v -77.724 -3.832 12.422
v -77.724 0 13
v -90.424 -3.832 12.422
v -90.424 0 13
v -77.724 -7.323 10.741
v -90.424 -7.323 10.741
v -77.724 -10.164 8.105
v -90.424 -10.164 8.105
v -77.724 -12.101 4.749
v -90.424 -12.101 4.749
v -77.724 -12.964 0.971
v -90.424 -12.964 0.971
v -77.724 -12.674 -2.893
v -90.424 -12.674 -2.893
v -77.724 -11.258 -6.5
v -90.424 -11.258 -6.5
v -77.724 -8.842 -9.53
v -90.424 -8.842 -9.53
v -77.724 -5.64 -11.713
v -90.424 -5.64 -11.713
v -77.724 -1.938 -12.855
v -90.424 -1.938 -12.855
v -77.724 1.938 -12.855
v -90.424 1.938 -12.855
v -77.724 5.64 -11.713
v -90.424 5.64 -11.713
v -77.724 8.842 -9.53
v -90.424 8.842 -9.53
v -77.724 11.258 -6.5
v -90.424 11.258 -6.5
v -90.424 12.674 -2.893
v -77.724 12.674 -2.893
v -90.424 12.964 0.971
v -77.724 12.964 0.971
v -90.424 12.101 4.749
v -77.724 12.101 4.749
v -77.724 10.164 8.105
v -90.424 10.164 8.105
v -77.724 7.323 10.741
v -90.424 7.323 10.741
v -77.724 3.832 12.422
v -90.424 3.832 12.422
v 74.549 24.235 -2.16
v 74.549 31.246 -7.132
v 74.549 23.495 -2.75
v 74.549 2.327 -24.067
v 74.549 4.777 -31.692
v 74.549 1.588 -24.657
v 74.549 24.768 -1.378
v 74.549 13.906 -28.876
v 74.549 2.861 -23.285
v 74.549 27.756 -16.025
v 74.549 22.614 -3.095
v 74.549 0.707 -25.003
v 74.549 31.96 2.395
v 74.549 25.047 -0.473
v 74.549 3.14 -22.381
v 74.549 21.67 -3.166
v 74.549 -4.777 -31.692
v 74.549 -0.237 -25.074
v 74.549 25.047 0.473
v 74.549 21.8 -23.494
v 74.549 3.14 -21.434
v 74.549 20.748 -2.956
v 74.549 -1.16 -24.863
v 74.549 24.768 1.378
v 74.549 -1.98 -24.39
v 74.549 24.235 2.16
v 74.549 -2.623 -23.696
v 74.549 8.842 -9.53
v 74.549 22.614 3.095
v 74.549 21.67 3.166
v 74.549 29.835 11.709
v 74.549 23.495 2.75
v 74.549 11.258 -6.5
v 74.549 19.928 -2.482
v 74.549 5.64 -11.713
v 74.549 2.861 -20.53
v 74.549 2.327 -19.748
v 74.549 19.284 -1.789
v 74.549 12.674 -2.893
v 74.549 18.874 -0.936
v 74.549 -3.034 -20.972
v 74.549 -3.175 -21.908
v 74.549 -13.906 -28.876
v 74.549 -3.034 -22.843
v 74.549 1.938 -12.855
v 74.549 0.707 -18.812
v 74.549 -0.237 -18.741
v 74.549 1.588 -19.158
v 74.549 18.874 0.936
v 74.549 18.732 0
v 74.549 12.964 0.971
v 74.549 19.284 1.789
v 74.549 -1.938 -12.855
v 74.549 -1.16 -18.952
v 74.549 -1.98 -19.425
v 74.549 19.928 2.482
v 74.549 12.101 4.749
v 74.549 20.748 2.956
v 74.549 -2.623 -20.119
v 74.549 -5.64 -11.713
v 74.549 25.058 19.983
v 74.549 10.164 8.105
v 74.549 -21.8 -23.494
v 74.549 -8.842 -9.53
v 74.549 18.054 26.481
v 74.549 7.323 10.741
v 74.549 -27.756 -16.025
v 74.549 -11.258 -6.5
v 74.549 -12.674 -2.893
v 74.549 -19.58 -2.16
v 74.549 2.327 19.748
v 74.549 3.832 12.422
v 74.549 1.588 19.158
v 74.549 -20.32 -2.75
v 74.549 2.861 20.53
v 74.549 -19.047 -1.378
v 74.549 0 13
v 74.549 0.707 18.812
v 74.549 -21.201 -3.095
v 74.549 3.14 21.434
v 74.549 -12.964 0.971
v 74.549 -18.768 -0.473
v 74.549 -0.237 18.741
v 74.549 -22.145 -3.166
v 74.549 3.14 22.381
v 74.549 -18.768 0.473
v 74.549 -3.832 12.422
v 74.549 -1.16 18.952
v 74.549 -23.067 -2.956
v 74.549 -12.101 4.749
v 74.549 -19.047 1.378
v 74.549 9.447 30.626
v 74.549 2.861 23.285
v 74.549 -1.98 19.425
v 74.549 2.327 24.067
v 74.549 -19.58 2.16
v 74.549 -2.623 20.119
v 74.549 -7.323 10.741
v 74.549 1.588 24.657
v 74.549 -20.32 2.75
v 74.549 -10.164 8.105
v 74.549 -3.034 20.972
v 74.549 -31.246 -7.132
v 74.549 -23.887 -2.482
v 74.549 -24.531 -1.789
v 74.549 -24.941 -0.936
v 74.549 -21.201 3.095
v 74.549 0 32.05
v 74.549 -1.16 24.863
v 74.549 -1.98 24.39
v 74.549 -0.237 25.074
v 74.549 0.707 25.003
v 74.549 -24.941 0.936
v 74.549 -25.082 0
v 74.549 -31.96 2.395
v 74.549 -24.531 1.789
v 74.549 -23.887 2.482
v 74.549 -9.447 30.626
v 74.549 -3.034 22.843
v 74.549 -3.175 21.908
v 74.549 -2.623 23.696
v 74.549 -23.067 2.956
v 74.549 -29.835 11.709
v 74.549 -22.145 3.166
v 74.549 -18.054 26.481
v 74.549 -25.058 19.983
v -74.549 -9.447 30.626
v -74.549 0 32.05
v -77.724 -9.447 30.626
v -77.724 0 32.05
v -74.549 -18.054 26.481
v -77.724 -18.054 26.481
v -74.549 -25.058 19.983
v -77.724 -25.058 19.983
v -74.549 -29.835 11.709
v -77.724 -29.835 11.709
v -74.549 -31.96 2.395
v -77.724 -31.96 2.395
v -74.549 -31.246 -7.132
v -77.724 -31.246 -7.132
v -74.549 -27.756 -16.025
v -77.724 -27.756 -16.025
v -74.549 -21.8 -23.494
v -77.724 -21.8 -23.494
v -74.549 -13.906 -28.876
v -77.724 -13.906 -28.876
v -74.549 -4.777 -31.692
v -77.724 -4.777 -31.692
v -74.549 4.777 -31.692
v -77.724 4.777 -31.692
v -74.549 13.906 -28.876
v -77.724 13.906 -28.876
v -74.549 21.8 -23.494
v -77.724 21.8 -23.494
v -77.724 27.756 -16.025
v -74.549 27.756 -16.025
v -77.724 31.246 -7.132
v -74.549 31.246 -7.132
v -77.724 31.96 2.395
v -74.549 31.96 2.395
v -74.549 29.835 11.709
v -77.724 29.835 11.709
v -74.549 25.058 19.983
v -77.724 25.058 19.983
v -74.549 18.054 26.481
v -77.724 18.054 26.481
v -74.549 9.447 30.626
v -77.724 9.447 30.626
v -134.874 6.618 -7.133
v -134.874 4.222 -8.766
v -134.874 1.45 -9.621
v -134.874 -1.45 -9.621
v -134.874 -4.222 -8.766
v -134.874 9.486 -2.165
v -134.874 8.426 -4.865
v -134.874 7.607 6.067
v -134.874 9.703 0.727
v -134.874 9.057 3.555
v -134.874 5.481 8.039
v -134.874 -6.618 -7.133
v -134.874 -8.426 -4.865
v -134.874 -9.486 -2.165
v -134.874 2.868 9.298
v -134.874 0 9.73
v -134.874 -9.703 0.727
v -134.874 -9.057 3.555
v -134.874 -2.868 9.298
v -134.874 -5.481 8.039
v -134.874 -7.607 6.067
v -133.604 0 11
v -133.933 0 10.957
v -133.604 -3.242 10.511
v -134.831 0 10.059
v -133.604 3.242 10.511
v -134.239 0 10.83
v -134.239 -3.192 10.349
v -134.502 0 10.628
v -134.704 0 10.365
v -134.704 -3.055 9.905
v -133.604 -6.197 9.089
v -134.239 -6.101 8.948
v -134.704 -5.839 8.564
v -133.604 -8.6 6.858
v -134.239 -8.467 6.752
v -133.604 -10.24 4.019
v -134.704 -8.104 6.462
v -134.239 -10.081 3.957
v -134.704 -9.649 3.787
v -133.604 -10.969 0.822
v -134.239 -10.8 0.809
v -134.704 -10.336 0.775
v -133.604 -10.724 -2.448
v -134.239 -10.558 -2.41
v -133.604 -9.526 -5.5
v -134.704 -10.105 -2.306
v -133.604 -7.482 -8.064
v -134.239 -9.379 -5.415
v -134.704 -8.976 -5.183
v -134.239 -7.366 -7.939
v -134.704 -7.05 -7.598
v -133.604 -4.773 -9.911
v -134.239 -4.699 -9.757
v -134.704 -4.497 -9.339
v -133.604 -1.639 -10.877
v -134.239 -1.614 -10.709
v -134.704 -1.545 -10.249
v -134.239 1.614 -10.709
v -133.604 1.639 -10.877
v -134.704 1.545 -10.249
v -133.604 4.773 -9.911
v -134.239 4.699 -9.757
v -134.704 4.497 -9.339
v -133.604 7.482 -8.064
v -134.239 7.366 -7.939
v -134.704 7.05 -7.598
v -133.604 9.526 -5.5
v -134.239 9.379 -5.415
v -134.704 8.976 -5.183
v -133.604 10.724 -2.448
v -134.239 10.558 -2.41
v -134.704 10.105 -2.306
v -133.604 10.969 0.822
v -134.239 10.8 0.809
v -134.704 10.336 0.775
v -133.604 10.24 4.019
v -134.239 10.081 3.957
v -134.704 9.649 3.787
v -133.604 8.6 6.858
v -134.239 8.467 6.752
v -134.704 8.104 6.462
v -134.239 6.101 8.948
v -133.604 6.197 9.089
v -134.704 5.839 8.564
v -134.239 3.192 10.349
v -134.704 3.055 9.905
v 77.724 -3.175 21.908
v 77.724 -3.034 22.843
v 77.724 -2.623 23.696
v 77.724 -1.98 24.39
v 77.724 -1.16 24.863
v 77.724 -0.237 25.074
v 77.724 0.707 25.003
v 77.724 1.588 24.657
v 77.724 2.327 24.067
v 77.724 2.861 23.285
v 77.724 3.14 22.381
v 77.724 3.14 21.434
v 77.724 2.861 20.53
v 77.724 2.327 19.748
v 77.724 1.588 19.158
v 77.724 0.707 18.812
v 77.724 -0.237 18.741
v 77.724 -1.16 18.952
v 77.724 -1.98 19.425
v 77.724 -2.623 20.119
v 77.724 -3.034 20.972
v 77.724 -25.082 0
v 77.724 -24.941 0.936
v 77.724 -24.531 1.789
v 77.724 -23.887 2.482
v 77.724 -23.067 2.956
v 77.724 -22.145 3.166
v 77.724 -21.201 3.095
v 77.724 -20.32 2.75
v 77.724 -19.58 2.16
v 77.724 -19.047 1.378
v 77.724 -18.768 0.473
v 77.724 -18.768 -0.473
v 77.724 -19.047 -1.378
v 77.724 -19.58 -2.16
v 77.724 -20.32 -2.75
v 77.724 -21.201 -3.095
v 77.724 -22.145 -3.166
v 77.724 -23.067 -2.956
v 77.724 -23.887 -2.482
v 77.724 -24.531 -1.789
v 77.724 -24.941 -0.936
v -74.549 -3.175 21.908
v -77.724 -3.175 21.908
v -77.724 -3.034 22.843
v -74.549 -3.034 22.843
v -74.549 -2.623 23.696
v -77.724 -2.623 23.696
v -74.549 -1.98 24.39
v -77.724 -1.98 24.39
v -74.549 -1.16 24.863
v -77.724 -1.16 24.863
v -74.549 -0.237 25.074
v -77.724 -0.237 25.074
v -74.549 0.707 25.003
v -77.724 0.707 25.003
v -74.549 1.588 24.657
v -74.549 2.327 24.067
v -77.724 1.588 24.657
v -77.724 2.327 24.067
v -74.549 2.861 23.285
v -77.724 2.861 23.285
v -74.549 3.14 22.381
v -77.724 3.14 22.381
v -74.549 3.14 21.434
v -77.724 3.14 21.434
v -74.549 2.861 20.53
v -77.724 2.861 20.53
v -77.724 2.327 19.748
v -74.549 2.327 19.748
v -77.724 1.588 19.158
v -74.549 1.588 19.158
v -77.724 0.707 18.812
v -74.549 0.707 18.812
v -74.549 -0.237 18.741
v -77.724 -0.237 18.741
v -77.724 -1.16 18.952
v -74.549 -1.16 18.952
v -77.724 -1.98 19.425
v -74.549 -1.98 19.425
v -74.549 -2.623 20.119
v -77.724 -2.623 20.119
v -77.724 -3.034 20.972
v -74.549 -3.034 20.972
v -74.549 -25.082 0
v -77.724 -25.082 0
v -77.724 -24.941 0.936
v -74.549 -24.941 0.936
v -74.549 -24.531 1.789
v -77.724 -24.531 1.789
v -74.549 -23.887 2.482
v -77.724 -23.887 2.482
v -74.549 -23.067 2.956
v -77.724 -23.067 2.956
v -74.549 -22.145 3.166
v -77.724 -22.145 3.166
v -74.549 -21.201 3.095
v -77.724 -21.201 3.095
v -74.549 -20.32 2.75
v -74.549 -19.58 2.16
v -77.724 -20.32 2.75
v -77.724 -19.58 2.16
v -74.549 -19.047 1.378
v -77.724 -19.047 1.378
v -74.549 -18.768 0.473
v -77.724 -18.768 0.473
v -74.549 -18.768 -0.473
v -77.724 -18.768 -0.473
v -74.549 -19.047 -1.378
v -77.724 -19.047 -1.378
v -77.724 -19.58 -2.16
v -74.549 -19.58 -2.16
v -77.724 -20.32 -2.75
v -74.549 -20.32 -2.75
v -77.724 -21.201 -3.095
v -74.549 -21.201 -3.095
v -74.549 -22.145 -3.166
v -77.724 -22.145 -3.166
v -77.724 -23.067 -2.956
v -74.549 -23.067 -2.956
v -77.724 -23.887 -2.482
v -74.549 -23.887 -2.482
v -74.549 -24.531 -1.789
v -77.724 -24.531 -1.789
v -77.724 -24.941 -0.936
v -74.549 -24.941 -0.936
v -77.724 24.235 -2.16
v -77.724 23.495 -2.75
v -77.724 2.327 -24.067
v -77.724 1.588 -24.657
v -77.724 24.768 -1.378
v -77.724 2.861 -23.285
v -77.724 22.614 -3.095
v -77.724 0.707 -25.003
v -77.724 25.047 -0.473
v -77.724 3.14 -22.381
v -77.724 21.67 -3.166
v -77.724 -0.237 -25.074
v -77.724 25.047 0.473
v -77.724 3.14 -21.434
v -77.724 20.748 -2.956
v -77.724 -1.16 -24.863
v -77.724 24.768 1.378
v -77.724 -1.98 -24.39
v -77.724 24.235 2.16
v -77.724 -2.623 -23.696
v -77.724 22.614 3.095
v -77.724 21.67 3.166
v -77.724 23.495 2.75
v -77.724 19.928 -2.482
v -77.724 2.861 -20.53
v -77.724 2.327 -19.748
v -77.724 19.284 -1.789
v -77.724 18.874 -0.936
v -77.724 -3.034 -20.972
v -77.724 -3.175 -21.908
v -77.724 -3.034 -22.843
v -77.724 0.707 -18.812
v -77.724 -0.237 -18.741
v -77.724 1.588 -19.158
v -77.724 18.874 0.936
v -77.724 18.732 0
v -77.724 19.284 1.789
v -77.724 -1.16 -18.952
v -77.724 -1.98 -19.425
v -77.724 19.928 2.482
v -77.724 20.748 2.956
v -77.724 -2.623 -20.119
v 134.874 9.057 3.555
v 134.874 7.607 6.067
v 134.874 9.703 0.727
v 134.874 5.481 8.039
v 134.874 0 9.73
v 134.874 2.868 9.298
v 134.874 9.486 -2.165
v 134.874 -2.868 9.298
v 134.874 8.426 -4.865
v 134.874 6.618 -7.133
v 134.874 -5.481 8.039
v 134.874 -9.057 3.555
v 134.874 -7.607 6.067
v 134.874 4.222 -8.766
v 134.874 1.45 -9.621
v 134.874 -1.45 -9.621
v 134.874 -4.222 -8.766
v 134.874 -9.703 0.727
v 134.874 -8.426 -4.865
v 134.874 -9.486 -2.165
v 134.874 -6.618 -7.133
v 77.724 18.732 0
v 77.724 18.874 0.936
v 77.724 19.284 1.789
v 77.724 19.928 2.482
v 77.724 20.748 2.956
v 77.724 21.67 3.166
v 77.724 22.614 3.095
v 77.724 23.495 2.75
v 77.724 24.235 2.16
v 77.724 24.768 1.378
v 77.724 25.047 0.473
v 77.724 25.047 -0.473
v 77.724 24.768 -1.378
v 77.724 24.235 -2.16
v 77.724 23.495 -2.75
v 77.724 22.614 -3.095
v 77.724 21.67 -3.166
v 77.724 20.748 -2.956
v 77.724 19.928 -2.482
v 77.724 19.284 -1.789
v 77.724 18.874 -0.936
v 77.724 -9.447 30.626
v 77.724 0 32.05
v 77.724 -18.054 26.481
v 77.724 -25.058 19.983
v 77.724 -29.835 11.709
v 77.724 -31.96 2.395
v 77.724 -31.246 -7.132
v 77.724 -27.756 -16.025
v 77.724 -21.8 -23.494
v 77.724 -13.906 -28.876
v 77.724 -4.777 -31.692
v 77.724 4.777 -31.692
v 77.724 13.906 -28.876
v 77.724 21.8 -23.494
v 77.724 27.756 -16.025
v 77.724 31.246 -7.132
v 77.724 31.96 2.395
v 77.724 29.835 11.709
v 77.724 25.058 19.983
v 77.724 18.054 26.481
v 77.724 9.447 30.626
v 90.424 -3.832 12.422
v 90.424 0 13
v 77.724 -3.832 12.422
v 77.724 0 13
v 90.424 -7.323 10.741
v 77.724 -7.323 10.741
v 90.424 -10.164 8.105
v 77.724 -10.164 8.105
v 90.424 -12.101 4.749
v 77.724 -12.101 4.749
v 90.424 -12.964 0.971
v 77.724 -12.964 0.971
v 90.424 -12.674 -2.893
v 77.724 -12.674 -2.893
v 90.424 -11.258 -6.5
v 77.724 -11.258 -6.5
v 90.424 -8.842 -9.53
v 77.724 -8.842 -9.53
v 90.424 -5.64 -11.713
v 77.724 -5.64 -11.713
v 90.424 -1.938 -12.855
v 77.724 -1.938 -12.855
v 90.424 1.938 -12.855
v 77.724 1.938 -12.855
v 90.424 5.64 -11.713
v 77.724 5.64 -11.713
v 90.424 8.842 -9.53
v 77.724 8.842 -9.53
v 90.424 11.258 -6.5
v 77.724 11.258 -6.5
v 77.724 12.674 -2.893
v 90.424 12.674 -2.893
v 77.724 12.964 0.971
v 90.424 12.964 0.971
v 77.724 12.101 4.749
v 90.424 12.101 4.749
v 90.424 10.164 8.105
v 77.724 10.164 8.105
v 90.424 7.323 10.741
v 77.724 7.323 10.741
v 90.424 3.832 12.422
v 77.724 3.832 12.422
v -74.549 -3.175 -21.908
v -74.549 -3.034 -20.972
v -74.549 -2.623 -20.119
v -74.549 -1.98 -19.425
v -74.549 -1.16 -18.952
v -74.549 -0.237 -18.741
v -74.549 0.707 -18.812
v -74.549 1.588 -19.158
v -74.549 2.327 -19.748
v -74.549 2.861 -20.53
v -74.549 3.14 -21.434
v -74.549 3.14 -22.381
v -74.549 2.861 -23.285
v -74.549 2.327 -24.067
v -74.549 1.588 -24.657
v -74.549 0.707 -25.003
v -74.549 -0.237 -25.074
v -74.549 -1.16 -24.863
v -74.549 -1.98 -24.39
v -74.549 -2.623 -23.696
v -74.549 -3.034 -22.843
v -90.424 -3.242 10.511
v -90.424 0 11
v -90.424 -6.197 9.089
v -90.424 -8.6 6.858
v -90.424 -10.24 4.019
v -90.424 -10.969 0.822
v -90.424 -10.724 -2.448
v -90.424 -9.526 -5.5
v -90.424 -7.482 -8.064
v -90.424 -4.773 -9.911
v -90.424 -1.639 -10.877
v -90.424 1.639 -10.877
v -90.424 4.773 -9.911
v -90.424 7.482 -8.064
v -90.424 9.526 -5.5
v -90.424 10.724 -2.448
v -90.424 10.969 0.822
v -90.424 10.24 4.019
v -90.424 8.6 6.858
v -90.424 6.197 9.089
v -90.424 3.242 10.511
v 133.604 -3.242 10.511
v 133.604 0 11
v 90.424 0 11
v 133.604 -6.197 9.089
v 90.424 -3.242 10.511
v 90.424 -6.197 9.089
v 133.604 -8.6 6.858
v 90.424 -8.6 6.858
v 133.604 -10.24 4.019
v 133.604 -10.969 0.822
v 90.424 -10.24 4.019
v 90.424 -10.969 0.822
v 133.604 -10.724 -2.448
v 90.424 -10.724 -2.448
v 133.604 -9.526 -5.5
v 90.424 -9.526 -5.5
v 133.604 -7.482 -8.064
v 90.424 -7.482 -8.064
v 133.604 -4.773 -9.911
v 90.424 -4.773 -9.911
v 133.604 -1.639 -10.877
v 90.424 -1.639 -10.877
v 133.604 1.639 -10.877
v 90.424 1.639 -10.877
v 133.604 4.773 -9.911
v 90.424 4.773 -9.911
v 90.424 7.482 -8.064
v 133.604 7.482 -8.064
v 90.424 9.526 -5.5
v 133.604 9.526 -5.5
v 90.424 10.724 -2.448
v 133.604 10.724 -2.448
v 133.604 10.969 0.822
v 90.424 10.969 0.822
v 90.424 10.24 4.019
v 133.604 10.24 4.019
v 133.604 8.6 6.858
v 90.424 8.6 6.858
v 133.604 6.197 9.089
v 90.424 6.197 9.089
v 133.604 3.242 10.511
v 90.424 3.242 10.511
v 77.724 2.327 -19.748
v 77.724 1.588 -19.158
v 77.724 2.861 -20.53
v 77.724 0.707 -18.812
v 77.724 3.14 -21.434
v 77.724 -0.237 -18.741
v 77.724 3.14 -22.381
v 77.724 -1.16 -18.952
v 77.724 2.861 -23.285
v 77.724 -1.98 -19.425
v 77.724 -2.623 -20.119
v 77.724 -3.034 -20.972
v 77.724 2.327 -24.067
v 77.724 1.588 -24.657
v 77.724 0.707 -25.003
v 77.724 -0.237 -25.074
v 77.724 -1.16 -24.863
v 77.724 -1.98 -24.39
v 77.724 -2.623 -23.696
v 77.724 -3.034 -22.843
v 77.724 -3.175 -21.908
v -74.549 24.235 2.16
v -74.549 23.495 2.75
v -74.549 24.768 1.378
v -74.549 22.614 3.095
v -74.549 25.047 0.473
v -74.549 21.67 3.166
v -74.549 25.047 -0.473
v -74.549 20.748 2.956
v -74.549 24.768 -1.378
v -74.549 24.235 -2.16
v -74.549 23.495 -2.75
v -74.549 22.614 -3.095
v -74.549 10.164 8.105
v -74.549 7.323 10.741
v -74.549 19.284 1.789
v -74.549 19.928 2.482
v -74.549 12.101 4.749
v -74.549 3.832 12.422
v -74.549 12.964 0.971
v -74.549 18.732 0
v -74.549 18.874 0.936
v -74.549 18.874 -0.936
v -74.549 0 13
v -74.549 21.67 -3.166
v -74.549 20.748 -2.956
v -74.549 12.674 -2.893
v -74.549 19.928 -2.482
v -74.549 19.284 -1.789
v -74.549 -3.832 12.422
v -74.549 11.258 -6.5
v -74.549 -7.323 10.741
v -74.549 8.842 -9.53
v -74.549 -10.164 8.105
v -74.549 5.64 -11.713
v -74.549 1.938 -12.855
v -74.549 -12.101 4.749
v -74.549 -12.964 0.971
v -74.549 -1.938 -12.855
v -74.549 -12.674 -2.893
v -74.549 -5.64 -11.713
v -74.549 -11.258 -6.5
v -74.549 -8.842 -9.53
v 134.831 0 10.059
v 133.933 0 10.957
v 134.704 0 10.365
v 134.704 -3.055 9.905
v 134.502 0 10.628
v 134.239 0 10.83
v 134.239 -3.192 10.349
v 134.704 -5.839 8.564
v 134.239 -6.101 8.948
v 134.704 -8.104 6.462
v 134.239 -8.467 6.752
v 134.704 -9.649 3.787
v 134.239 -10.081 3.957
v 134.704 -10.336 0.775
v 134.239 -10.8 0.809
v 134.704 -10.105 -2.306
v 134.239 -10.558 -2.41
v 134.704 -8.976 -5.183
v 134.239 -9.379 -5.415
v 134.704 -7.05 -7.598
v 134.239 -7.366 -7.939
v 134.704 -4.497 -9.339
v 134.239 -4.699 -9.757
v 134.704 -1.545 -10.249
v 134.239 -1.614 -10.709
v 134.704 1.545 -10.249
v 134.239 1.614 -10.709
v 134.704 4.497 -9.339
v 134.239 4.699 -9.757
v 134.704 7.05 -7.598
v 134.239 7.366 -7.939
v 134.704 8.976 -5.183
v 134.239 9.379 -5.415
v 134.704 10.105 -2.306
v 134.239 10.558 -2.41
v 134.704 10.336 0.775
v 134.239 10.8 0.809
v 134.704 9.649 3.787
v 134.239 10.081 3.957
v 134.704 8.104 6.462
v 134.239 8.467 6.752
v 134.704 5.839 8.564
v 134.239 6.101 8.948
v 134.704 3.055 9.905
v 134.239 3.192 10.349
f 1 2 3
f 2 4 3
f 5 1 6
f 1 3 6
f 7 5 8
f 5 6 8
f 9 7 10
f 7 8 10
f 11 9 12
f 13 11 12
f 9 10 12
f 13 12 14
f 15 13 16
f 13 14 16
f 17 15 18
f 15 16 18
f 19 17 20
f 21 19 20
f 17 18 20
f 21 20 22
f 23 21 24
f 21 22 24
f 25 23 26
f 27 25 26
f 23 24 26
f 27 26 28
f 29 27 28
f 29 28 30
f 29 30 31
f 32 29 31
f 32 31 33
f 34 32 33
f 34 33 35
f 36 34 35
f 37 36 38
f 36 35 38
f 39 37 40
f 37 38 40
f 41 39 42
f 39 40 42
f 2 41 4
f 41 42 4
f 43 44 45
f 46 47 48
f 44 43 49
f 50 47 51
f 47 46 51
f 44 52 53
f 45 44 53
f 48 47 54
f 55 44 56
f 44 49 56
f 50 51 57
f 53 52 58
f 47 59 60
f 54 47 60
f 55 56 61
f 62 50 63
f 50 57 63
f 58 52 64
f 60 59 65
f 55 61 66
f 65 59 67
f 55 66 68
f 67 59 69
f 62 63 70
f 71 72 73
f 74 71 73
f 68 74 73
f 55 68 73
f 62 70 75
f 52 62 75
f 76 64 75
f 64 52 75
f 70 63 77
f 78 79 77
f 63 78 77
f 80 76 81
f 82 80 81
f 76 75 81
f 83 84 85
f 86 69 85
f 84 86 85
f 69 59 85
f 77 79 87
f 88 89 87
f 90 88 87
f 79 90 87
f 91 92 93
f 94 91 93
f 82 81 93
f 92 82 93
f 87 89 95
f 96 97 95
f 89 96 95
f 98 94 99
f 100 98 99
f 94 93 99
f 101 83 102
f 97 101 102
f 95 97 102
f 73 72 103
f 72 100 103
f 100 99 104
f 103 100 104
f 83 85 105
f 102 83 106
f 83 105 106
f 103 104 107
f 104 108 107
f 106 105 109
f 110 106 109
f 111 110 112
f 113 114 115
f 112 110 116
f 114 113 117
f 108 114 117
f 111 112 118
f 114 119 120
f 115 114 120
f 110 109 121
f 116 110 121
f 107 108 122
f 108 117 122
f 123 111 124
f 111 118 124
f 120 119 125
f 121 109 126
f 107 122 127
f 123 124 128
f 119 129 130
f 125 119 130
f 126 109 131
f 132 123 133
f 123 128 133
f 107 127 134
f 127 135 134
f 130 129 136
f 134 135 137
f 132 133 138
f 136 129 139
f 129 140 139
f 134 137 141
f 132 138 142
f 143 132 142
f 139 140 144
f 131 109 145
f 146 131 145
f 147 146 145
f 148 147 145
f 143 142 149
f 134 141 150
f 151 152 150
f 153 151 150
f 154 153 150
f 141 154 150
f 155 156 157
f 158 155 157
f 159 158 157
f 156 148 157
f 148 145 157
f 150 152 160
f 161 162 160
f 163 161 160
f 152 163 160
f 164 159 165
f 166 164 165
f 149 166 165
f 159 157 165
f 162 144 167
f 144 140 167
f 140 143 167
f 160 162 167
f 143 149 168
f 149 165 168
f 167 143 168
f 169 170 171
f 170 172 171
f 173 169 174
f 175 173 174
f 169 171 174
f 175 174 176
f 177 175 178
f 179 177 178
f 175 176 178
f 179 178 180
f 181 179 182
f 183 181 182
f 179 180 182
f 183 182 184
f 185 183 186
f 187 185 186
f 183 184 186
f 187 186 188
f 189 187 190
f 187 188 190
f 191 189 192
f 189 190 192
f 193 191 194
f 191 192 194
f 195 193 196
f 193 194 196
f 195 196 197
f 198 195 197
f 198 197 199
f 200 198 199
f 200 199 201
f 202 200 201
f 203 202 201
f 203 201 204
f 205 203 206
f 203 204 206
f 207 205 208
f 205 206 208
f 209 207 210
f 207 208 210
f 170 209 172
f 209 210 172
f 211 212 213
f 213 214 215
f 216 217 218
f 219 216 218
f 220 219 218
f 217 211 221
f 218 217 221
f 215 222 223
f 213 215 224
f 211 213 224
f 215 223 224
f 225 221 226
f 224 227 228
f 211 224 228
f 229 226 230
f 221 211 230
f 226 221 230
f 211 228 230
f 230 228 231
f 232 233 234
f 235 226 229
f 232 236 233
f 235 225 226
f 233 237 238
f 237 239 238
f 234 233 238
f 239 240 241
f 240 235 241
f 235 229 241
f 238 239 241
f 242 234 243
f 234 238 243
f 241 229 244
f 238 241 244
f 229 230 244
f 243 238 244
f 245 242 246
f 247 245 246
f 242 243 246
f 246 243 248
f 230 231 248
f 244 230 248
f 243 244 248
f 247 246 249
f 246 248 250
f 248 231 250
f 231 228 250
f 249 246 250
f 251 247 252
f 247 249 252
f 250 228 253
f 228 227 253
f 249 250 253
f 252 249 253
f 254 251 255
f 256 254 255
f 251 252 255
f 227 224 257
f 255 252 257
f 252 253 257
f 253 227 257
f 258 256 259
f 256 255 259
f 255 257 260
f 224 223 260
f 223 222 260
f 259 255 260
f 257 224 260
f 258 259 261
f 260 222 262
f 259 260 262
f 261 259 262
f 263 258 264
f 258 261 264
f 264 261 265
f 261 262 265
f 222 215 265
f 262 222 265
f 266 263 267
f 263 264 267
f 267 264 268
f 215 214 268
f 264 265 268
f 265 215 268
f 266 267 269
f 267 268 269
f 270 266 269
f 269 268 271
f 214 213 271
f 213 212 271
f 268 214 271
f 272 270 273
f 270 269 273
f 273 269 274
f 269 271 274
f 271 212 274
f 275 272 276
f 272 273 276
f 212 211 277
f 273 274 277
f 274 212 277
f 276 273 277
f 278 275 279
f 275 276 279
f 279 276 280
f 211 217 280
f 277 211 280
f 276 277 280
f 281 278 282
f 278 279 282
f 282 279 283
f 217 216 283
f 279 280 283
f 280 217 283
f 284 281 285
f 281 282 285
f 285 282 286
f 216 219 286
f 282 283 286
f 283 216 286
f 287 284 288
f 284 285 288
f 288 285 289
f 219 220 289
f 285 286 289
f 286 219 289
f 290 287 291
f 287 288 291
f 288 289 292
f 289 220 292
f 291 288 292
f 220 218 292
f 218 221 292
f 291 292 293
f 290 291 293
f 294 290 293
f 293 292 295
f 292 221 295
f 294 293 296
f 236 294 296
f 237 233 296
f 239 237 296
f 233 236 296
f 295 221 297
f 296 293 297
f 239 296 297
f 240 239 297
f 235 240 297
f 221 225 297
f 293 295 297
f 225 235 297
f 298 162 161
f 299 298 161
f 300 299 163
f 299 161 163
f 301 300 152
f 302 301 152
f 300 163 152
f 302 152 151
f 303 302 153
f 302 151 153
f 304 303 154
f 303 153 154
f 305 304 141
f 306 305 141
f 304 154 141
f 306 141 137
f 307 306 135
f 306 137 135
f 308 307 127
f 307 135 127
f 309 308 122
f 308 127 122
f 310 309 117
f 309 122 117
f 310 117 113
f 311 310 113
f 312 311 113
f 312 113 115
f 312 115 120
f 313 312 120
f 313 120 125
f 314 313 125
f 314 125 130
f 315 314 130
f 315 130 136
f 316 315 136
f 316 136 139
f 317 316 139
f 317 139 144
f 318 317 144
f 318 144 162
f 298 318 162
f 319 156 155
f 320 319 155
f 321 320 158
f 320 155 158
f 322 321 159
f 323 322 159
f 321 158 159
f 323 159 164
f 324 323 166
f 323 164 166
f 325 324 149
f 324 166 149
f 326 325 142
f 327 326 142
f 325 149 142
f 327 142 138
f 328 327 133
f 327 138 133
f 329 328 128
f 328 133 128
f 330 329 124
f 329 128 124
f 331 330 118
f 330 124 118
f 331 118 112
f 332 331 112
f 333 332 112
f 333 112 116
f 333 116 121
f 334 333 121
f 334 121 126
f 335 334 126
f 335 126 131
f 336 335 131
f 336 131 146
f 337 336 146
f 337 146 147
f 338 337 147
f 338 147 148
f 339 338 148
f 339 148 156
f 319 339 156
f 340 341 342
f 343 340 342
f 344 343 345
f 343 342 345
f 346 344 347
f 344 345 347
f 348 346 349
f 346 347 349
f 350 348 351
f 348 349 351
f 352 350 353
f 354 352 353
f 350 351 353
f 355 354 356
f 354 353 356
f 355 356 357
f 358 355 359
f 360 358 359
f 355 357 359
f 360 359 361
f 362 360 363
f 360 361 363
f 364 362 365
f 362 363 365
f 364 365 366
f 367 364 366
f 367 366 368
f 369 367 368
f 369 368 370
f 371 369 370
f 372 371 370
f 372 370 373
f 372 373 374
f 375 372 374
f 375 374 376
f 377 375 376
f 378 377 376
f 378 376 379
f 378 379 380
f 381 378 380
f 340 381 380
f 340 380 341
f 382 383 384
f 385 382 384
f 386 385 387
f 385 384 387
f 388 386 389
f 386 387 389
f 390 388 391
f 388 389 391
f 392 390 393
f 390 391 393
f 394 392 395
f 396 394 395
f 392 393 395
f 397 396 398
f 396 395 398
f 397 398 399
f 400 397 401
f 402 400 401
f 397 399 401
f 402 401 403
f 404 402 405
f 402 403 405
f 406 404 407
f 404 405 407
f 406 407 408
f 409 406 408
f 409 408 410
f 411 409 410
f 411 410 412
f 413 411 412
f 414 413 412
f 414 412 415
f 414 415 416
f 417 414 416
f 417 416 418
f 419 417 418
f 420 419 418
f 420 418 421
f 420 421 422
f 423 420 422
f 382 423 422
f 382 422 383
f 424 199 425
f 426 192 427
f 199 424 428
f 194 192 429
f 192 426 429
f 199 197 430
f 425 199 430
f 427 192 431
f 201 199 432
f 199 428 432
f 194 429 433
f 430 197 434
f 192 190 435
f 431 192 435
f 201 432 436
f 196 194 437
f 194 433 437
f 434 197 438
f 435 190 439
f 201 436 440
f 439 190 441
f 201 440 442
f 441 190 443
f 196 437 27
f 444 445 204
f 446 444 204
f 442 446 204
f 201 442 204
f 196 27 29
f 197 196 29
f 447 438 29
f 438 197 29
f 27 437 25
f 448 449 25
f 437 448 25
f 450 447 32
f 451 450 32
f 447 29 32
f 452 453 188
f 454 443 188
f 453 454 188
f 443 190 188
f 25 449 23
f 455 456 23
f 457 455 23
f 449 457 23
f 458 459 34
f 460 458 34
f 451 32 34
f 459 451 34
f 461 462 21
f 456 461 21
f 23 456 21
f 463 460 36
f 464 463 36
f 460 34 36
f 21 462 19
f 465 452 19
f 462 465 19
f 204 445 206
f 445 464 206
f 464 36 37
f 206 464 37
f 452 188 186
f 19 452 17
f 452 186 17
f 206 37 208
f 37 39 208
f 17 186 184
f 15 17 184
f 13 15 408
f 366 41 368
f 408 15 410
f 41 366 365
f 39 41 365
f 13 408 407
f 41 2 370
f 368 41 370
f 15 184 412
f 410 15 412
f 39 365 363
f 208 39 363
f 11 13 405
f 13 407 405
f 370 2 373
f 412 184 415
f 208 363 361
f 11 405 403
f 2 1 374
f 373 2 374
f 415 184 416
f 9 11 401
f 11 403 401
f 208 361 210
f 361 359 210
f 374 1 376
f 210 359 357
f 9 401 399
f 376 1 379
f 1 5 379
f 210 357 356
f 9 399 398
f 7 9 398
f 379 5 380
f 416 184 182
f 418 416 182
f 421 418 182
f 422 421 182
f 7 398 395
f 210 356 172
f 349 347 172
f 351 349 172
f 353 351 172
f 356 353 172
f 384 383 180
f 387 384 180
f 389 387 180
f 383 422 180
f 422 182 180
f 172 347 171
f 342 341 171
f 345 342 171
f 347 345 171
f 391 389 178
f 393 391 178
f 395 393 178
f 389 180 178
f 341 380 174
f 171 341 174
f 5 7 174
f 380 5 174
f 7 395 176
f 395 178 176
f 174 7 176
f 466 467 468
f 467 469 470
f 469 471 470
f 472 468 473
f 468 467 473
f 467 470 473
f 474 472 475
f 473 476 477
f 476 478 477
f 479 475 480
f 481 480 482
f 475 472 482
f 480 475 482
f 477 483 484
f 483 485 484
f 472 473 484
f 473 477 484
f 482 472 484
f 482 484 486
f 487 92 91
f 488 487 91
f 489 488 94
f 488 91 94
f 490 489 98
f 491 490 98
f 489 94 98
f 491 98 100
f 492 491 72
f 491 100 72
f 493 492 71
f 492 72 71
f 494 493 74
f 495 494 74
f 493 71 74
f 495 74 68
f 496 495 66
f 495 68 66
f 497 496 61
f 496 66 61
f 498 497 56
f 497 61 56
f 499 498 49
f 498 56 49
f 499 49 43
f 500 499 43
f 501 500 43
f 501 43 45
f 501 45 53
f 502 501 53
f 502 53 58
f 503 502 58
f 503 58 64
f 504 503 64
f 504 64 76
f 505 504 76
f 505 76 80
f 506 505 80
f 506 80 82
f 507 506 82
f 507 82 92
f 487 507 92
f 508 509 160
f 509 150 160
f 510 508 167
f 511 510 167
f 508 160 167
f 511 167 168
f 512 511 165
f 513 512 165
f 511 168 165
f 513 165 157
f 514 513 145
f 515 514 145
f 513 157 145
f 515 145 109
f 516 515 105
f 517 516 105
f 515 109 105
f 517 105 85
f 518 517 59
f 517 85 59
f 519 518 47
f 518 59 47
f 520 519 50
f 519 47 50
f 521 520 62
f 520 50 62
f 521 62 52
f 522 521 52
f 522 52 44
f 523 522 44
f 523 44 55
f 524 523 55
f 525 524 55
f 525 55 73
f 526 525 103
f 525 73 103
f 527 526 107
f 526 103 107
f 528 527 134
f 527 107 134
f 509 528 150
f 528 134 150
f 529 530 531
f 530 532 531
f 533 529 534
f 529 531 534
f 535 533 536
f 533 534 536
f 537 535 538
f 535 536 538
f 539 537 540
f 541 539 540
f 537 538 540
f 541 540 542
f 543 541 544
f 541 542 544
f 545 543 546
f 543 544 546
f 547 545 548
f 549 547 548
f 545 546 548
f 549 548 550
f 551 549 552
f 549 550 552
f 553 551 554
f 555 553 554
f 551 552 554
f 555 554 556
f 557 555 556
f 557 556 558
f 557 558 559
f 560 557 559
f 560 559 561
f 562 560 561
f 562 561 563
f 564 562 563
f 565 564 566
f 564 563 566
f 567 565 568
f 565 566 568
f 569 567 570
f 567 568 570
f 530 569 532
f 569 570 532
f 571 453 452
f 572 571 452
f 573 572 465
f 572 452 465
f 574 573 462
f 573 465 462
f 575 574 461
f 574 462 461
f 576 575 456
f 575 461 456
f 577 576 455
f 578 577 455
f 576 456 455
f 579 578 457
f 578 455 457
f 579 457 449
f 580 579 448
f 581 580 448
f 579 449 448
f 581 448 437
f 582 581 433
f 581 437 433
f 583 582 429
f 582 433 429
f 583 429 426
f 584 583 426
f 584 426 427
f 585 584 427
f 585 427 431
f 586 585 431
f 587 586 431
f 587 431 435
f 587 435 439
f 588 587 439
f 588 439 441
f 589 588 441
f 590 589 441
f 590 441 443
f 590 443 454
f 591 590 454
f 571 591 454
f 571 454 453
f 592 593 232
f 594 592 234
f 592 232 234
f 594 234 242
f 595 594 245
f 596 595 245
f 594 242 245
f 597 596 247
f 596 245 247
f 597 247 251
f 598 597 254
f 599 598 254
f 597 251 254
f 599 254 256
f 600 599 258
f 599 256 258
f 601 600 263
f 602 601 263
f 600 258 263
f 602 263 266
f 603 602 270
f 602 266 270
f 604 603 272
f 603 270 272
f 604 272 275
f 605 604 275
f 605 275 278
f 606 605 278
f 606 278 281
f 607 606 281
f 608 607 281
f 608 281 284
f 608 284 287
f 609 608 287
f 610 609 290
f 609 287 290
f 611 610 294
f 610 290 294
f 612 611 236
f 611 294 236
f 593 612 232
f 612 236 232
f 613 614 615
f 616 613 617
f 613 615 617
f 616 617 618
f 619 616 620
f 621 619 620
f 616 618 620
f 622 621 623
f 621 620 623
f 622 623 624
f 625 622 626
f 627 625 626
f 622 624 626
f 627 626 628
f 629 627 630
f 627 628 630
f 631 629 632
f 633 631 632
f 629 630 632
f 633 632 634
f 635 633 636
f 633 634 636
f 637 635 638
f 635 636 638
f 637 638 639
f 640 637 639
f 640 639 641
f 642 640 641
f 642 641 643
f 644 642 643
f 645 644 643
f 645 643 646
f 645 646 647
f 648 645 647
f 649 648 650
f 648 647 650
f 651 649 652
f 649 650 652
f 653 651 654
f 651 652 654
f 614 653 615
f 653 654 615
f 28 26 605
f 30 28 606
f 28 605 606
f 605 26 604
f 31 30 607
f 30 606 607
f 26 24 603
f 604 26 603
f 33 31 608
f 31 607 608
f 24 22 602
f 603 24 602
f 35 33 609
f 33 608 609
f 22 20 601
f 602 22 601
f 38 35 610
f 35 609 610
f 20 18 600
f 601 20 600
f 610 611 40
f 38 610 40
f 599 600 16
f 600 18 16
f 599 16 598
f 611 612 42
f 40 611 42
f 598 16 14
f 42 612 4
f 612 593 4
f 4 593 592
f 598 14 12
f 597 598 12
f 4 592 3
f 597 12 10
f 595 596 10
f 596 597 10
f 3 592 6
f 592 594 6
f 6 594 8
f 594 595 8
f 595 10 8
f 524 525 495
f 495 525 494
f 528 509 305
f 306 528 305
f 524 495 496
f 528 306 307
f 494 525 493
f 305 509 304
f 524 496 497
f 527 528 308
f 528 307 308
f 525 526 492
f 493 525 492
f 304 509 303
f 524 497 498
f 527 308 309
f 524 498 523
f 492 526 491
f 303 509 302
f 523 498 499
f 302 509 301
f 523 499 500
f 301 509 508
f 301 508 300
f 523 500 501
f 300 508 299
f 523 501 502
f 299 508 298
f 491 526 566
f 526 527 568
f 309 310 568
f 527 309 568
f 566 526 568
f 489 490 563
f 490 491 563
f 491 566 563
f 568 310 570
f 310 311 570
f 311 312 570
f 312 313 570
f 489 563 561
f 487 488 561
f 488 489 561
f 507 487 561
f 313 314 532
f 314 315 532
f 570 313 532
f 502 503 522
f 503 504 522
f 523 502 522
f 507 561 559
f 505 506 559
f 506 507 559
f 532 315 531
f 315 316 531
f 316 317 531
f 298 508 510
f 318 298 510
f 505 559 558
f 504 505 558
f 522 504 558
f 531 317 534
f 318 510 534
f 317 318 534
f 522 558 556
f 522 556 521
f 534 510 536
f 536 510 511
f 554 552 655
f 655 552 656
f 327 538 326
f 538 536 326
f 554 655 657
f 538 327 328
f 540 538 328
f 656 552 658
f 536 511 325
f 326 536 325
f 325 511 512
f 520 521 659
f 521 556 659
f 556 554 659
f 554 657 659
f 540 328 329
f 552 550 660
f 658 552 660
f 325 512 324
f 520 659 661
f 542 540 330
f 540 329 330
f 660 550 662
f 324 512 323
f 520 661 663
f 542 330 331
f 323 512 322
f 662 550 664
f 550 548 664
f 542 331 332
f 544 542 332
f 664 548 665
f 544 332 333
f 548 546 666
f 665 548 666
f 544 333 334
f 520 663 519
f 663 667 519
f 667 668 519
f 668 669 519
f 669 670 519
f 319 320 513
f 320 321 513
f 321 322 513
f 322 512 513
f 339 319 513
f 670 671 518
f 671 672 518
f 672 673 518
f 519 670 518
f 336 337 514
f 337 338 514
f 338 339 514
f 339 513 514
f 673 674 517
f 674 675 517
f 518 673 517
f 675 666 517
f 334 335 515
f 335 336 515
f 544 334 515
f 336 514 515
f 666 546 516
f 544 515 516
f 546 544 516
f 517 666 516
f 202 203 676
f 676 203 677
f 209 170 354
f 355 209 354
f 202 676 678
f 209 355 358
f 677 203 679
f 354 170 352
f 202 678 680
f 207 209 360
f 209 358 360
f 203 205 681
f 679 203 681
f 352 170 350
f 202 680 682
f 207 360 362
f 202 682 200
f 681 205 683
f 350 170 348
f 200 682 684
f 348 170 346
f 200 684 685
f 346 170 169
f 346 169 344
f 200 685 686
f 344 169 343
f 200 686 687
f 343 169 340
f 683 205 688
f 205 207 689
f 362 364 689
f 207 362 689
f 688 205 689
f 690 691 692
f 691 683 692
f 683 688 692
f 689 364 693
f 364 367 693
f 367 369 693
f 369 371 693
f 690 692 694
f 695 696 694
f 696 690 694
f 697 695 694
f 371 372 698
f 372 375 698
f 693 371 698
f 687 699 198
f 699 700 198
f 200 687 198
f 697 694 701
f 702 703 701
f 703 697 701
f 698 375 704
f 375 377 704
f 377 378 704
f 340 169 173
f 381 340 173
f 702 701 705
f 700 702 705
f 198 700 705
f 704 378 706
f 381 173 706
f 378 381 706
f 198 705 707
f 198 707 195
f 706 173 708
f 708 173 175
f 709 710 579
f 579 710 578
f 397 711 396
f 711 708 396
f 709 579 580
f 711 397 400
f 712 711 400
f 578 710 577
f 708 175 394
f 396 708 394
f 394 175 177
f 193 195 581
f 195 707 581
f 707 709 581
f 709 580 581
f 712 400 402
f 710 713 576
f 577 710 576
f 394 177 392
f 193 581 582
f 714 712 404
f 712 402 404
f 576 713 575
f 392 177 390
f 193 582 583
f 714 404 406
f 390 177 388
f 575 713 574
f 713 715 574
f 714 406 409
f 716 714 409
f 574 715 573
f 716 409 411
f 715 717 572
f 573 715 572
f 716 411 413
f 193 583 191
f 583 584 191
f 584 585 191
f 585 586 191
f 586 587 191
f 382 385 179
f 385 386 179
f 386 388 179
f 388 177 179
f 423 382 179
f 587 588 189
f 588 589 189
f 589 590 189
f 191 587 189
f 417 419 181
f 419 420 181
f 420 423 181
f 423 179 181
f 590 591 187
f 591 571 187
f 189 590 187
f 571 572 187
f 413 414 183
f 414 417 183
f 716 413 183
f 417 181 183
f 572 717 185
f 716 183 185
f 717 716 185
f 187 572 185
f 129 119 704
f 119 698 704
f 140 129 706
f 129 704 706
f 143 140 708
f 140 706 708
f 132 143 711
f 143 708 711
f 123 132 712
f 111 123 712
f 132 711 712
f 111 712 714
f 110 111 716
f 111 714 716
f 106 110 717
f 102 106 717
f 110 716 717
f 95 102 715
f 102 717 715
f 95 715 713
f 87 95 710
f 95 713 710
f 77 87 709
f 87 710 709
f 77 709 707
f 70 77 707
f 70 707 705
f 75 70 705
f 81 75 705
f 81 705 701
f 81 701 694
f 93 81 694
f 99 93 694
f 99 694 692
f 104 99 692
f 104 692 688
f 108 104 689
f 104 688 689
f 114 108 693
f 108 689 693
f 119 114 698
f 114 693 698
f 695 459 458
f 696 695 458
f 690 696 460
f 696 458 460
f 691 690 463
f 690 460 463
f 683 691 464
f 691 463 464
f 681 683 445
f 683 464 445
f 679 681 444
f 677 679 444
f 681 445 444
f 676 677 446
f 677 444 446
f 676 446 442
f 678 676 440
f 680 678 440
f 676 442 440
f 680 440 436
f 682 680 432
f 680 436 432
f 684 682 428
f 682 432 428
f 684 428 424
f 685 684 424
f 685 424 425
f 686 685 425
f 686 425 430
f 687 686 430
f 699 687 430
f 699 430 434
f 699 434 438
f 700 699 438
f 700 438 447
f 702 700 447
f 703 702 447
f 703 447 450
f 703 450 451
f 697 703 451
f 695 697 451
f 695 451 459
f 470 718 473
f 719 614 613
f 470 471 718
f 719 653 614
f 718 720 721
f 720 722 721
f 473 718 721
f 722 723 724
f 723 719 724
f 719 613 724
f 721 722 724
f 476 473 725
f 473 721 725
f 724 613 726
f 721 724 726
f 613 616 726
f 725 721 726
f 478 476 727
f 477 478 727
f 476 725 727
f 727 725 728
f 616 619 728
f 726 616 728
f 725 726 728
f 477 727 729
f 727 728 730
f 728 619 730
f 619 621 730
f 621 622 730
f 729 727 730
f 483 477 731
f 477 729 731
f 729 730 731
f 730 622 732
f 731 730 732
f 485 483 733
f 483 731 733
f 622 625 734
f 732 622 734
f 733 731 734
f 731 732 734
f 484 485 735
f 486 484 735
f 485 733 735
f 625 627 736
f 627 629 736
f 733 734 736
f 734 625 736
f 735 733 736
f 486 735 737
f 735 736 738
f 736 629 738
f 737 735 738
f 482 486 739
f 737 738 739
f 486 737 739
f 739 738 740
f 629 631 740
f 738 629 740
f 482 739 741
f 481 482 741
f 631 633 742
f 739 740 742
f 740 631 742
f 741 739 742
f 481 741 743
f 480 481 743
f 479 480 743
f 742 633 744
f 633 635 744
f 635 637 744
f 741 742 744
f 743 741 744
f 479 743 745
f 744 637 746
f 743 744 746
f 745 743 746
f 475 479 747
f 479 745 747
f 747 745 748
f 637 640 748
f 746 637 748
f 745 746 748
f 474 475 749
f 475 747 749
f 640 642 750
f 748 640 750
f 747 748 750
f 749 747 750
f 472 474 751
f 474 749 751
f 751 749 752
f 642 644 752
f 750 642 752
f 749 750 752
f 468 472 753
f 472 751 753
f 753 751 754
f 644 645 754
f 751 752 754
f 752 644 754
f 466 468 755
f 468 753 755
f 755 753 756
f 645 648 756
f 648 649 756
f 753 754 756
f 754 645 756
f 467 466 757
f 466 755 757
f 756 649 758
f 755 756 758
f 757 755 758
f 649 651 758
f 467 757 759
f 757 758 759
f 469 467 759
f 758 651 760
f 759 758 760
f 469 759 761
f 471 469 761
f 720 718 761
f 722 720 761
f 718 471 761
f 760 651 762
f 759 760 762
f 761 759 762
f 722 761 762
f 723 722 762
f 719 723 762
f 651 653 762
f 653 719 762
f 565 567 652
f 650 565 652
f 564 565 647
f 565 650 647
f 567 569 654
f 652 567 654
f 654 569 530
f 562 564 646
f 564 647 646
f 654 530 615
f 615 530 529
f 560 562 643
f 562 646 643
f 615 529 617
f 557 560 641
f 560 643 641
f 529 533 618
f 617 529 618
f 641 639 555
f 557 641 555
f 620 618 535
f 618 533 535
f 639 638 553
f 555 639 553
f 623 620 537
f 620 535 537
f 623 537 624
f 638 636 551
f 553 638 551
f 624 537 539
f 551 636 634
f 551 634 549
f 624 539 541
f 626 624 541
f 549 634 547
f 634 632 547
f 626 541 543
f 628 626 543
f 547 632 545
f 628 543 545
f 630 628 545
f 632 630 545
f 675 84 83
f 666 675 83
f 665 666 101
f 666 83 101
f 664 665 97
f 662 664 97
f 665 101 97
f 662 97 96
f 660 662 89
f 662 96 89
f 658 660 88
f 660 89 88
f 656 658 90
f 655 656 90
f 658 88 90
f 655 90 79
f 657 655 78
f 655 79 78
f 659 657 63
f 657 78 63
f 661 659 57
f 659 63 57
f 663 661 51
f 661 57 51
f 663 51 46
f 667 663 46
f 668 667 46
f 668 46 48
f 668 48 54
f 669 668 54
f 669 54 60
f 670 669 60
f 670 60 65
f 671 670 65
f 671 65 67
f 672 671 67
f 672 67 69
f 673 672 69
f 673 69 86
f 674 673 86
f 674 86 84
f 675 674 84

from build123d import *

# Parameters (mm, degrees)
F6_R     = 3.175
F7_DEPTH = 177.8


with BuildPart() as f1:
    # F0 (on Front) → F1 (revolve)
    with BuildSketch(Plane.XZ):
        with BuildLine():
            Line((-134.874, 9.73), (-134.874, 0))
            Line((-134.874, 0), (134.874, 0))
            Line((134.874, 0), (134.874, 9.73))
            ThreePointArc((134.874, 9.73), (134.502026, 10.628026), (133.604, 11))
            Line((133.604, 11), (90.424, 11))
            Line((90.424, 11), (90.424, 13))
            Line((90.424, 13), (77.724, 13))
            Line((77.724, 13), (77.724, 32.05))
            Line((77.724, 32.05), (74.549, 32.05))
            Line((74.549, 32.05), (74.549, 13))
            Line((74.549, 13), (-74.549, 13))
            Line((-74.549, 13), (-74.549, 32.05))
            Line((-74.549, 32.05), (-77.724, 32.05))
            Line((-77.724, 32.05), (-77.724, 13))
            Line((-77.724, 13), (-90.424, 13))
            Line((-90.424, 13), (-90.424, 11))
            Line((-90.424, 11), (-133.604, 11))
            ThreePointArc((-133.604, 11), (-134.502026, 10.628026), (-134.874, 9.73))
        make_face()
    revolve(axis=Axis((-8.171387, 0, 0), (1, 0, 0)))


with BuildPart() as f2_1:
    # F2: copy of F1
    add(f1.part)


with BuildPart() as f4_1:
    # F4: copy of F2_1
    add(f2_1.part)

    # F6 (on face) → F7 (cut)
    with BuildSketch(Plane(origin=(-77.724, 0, 0), x_dir=(0, -1, 0), z_dir=(-1, 0, 0))):
        with Locations((0, 21.9075)):
            Circle(F6_R)
        with Locations((-21.9075, 0)):
            Circle(F6_R)
        with Locations((0, -21.9075)):
            Circle(F6_R)
        with Locations((21.9075, 0)):
            Circle(F6_R)
    extrude(amount=-F7_DEPTH, mode=Mode.SUBTRACT)


solid = f4_1.part
